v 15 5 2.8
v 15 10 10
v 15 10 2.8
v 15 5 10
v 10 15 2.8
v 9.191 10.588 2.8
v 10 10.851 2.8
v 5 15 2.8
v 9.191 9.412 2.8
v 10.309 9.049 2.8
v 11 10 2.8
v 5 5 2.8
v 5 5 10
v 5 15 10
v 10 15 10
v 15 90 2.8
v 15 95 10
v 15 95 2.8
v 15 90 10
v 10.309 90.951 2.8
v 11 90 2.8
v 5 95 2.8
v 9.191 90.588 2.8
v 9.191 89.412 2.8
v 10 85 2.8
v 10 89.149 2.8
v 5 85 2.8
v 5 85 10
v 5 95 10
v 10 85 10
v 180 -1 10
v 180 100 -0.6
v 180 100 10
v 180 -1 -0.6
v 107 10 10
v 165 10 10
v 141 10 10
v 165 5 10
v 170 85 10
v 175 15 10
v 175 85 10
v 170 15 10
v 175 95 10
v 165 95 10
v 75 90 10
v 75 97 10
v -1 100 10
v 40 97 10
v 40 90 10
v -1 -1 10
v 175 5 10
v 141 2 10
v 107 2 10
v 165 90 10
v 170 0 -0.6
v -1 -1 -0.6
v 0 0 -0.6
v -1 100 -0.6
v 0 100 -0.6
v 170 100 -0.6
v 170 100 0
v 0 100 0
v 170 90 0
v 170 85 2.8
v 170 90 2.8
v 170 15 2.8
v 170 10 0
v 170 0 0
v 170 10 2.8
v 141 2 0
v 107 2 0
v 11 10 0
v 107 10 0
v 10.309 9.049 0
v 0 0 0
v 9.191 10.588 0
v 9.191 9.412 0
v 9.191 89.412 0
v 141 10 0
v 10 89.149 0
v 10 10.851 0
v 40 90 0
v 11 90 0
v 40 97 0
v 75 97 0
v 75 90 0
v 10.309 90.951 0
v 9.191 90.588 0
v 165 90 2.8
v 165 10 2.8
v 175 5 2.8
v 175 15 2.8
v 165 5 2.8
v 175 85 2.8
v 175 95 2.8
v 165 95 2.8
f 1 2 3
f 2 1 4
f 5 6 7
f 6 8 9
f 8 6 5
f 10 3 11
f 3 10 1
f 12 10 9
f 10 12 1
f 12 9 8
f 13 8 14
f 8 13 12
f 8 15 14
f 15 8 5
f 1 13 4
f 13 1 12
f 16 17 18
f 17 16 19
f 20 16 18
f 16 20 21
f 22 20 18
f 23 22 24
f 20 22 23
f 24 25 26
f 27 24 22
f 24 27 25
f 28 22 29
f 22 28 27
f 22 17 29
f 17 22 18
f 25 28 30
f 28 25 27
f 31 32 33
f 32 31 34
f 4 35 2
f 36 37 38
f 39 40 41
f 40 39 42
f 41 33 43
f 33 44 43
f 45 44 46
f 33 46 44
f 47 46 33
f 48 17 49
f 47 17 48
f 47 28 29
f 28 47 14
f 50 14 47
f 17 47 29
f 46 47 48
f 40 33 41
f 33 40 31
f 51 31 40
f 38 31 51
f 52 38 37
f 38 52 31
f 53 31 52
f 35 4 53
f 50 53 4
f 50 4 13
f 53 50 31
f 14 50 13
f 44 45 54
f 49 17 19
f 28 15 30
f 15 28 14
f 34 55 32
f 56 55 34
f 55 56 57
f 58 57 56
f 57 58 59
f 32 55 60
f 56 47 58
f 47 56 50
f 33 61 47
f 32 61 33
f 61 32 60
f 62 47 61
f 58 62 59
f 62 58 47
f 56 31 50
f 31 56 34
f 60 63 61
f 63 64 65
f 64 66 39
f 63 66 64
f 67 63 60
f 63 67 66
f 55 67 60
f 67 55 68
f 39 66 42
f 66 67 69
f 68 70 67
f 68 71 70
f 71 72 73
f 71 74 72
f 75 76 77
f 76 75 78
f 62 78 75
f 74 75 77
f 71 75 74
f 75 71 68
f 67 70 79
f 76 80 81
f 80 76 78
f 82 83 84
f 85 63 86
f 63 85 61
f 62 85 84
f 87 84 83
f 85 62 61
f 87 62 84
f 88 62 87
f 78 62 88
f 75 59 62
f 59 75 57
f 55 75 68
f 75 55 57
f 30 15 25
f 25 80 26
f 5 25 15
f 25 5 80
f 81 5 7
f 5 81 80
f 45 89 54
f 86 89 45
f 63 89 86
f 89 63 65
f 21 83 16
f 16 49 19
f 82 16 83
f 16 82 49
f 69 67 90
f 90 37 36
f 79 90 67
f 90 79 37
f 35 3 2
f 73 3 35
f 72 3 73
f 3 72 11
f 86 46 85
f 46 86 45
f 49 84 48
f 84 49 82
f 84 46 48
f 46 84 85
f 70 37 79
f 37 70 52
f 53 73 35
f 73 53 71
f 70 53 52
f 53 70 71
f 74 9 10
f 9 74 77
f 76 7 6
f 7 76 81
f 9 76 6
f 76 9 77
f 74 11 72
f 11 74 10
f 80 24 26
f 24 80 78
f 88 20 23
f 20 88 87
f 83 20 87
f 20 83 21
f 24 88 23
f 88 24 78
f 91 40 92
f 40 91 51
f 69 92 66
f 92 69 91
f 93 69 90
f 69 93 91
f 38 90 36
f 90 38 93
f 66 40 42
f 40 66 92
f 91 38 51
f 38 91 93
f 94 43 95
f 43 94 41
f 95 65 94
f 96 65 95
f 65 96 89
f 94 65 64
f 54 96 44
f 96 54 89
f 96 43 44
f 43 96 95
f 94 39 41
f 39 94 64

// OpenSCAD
//$fn=100;

pcb_border=1;
pcb_thickness=0.6;
dove_d=7;
dove_h=20;

touch_pcb_x = 170;
touch_pcb_y = 100;
matrix_border_width = 10;
led_x = 160;
led_y = 80;
module ledmatrix()
{
    cube([led_x,led_y,2.8]);

}
module touchpcb()
{
    cube([touch_pcb_x,touch_pcb_y,pcb_thickness]);
}

module chassis(number_of_panels=1)
{
    {
    difference()
    {
        union()
        {
            difference()
            {
            color("blue")

                // z offset base object to mill out pcb
                translate([-pcb_border, -pcb_border, -pcb_thickness])
                // base object
                cube([
                    ((number_of_panels == 1)?touch_pcb_x+10:touch_pcb_x)+pcb_border,
                    touch_pcb_y+pcb_border,
                    10+pcb_thickness
                ]);
                // mill out pcb
                translate([0,0,-pcb_thickness])
                    cube([touch_pcb_x,touch_pcb_y,pcb_thickness]);

                // led matrix
                led_z_cutout = 20;
                translate([matrix_border_width,matrix_border_width,0])
                    cube([led_x,led_y,led_z_cutout]);

                // pinheader opening top left
                translate([40,90-2,0])
                cube([35,10-1,20]);
                // pinheader opening bottom right
                translate([107,2,0])
                cube([34,10-1,20]);

                // openings for z clamps
                for(y=[10-5,90-5])
                {
                translate([10-5,y,2.8])
                    cube([10,10,10]);
                }

                // clear out corners
                translate([10,10,0])
                    cylinder(20,d=2);
                translate([10,90,0])
                    cylinder(20,d=2);

                if (number_of_panels > 1)
                {
                    asymetry_length = 30;
                    // creating asymetry: short end
                    translate([
                        led_x + matrix_border_width -asymetry_length,
                        90,
                        0
                    ])
                        cube([30,10,20]);
                    translate([
                        led_x + matrix_border_width-asymetry_length,
                        led_y +matrix_border_width,
                        0
                    ])
                    translate([0,5,0])
                        dove(dove_d,dove_h);
                }


            }
            color("red")
            {
                if (number_of_panels > 1)
                {
                    // creating asymetry; extended end
                    translate([led_x + matrix_border_width,0,0])
                    difference()
                    {
                        cube([asymetry_length,10,10]);
                        translate([asymetry_length,5,0])
                        dove(dove_d,dove_h);
                    }
                }
            }
        }
        translate([170-5,5,2.8])
            cube([10,10,10]);

        if (number_of_panels == 1)
        {
            translate([170-5,90-5,2.8])
               cube([10,10,10]);
       }

    }
    }
}
module one_assembly(number_of_panels)
{

    for(i=[0:number_of_panels-1])
    {
        translate([(i>0?i+1:0)*170,(i>0?100:0),0])
        rotate([0,0,(i>0?1:0)*180])
        {
            color("green")
            touchpcb();
            color("red")
            linear_extrude(height = 15)
            import("pcb-touch-simple-B_Mask-connectors.svg");

            color("white")
            translate([0,0,-0.1])
            linear_extrude(height = 0.2)
            import("pcb-touch-simple-F_Cu.svg");
        }

        translate([10,10,0.6])
        translate([(i)*160,0,0])
        ledmatrix();
    }

    translate([0,0,0.6])
    for(i=[0:number_of_panels-1])
    {
       translate([2*i*170,i*100,0])
       rotate([0,0,i*180])

       chassis(number_of_panels);
    }
}


module dove(d=5,height=10)
{
    for(i=[0:1])
    {
        mirror([i,0,0])
       translate([-d/4,0,0])
                cylinder(height,d=d,$fn=3);
    }
    translate([0,0,height/2])
    cube([d/2,3,height],center=true);
}

if(1)
{
//    one_assembly(1);
    chassis(1);
}
else
{
    dove(dove_d,10);
}
